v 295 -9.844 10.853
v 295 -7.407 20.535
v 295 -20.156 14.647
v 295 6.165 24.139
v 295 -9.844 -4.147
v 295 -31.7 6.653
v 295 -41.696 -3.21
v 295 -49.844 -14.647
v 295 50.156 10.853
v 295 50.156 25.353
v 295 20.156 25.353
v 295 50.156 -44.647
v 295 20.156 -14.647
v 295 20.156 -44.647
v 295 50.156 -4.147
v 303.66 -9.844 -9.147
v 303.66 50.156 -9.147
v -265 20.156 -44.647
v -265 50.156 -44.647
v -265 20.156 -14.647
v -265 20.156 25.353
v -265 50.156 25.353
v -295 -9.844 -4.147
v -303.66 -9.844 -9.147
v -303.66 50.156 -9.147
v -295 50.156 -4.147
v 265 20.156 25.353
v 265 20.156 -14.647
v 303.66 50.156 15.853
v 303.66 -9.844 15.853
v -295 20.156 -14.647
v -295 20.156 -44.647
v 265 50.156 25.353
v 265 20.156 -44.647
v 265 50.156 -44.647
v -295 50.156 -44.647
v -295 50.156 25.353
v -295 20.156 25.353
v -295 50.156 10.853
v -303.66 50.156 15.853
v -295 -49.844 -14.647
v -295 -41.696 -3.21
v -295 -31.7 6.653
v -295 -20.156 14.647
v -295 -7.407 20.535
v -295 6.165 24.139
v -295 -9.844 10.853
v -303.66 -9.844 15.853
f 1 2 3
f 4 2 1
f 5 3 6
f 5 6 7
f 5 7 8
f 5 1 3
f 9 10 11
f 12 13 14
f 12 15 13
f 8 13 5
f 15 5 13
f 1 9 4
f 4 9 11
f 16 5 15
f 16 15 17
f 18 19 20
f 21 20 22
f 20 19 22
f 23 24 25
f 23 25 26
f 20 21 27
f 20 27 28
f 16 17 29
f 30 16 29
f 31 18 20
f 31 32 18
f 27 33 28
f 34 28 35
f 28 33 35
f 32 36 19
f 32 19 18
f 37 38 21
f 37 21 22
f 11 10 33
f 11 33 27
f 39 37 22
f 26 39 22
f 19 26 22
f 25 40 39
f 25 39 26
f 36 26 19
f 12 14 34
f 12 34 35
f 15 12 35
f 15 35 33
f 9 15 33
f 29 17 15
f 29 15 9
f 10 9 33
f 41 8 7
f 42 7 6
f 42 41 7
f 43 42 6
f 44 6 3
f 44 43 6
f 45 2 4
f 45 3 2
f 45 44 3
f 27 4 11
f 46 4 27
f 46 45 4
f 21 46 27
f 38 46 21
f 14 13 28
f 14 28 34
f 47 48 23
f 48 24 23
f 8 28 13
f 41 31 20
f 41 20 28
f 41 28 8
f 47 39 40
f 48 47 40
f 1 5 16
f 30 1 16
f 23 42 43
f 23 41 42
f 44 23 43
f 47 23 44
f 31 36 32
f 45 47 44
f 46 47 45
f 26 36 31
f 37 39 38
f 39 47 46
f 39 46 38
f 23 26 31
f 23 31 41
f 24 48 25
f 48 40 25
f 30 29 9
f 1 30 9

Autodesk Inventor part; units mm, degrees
ref_plane "YZ Plane" through (0, 0, 0) normal (1, 0, 0) x (0, 1, 0)
ref_plane "XZ Plane" through (0, 0, 0) normal (0, 1, 0) x (-1, 0, 0)
ref_plane "XY Plane" through (0, 0, 0) normal (0, 0, 1) x (1, 0, 0)
sketch "Эскиз1" plane through (0, 0, 0) normal (1, 0, 0) x (0, 1, 0)
  line L0 (20.1556, 25.3526) -> (20.1556, -14.6474)
  line L1 (20.1556, -14.6474) -> (-49.8444, -14.6474)
  arc A0 (20.1556, 25.3526) -> (-49.8444, -14.6474) centre (20.1556, -55.8974) ccw
  line L2 (20.1556, -14.6474) -> (-20.1556, 14.6474) construction
  point P0 (0, 0)
  point P1 (0, 0)
  dimension "d0" = 70
  dimension "d2" = 40
extrude "Выдавливание1" add sketch "Эскиз1" along normal mid plane 590
sketch "Эскиз6" plane through (295, 0, 0) normal (1, 0, 0) x (0, 0, -1)
  line L0 (14.6474, 20.1556) -> (-25.3526, 20.1556) projected
  line L1 (-25.3526, 20.1556) -> (44.6474, 20.1556)
  line L2 (44.6474, 20.1556) -> (44.6474, 50.1556)
  line L3 (44.6474, 50.1556) -> (-25.3526, 50.1556)
  line L4 (-25.3526, 50.1556) -> (-25.3526, 20.1556)
  point P0 (0, 0)
  dimension "d13" = 70
  dimension "d14" = 30
extrude "Выдавливание3" add sketch "Эскиз6" against normal blind 30
sketch "Эскиз7" plane through (295, 50.1556, 25.3526) normal (0, 1, 0) x (1, 0, 0)
  line L0 (0, 29.5) -> (8.6603, 34.5) projected
  line L1 (0, 14.5) -> (0, 29.5) projected
  line L2 (8.6603, 9.5) -> (0, 14.5) projected
  line L3 (8.6603, 34.5) -> (8.6603, 9.5) projected
  point P0 (-295, 25.3526)
extrude "Выдавливание4" add sketch "Эскиз7" against normal blind 60
mirror "Зеркальное отражение3" about plane through (0, 0, 0) normal (1, 0, 0) of "Выдавливание3", "Выдавливание4"
properties part number "Нижний край"
